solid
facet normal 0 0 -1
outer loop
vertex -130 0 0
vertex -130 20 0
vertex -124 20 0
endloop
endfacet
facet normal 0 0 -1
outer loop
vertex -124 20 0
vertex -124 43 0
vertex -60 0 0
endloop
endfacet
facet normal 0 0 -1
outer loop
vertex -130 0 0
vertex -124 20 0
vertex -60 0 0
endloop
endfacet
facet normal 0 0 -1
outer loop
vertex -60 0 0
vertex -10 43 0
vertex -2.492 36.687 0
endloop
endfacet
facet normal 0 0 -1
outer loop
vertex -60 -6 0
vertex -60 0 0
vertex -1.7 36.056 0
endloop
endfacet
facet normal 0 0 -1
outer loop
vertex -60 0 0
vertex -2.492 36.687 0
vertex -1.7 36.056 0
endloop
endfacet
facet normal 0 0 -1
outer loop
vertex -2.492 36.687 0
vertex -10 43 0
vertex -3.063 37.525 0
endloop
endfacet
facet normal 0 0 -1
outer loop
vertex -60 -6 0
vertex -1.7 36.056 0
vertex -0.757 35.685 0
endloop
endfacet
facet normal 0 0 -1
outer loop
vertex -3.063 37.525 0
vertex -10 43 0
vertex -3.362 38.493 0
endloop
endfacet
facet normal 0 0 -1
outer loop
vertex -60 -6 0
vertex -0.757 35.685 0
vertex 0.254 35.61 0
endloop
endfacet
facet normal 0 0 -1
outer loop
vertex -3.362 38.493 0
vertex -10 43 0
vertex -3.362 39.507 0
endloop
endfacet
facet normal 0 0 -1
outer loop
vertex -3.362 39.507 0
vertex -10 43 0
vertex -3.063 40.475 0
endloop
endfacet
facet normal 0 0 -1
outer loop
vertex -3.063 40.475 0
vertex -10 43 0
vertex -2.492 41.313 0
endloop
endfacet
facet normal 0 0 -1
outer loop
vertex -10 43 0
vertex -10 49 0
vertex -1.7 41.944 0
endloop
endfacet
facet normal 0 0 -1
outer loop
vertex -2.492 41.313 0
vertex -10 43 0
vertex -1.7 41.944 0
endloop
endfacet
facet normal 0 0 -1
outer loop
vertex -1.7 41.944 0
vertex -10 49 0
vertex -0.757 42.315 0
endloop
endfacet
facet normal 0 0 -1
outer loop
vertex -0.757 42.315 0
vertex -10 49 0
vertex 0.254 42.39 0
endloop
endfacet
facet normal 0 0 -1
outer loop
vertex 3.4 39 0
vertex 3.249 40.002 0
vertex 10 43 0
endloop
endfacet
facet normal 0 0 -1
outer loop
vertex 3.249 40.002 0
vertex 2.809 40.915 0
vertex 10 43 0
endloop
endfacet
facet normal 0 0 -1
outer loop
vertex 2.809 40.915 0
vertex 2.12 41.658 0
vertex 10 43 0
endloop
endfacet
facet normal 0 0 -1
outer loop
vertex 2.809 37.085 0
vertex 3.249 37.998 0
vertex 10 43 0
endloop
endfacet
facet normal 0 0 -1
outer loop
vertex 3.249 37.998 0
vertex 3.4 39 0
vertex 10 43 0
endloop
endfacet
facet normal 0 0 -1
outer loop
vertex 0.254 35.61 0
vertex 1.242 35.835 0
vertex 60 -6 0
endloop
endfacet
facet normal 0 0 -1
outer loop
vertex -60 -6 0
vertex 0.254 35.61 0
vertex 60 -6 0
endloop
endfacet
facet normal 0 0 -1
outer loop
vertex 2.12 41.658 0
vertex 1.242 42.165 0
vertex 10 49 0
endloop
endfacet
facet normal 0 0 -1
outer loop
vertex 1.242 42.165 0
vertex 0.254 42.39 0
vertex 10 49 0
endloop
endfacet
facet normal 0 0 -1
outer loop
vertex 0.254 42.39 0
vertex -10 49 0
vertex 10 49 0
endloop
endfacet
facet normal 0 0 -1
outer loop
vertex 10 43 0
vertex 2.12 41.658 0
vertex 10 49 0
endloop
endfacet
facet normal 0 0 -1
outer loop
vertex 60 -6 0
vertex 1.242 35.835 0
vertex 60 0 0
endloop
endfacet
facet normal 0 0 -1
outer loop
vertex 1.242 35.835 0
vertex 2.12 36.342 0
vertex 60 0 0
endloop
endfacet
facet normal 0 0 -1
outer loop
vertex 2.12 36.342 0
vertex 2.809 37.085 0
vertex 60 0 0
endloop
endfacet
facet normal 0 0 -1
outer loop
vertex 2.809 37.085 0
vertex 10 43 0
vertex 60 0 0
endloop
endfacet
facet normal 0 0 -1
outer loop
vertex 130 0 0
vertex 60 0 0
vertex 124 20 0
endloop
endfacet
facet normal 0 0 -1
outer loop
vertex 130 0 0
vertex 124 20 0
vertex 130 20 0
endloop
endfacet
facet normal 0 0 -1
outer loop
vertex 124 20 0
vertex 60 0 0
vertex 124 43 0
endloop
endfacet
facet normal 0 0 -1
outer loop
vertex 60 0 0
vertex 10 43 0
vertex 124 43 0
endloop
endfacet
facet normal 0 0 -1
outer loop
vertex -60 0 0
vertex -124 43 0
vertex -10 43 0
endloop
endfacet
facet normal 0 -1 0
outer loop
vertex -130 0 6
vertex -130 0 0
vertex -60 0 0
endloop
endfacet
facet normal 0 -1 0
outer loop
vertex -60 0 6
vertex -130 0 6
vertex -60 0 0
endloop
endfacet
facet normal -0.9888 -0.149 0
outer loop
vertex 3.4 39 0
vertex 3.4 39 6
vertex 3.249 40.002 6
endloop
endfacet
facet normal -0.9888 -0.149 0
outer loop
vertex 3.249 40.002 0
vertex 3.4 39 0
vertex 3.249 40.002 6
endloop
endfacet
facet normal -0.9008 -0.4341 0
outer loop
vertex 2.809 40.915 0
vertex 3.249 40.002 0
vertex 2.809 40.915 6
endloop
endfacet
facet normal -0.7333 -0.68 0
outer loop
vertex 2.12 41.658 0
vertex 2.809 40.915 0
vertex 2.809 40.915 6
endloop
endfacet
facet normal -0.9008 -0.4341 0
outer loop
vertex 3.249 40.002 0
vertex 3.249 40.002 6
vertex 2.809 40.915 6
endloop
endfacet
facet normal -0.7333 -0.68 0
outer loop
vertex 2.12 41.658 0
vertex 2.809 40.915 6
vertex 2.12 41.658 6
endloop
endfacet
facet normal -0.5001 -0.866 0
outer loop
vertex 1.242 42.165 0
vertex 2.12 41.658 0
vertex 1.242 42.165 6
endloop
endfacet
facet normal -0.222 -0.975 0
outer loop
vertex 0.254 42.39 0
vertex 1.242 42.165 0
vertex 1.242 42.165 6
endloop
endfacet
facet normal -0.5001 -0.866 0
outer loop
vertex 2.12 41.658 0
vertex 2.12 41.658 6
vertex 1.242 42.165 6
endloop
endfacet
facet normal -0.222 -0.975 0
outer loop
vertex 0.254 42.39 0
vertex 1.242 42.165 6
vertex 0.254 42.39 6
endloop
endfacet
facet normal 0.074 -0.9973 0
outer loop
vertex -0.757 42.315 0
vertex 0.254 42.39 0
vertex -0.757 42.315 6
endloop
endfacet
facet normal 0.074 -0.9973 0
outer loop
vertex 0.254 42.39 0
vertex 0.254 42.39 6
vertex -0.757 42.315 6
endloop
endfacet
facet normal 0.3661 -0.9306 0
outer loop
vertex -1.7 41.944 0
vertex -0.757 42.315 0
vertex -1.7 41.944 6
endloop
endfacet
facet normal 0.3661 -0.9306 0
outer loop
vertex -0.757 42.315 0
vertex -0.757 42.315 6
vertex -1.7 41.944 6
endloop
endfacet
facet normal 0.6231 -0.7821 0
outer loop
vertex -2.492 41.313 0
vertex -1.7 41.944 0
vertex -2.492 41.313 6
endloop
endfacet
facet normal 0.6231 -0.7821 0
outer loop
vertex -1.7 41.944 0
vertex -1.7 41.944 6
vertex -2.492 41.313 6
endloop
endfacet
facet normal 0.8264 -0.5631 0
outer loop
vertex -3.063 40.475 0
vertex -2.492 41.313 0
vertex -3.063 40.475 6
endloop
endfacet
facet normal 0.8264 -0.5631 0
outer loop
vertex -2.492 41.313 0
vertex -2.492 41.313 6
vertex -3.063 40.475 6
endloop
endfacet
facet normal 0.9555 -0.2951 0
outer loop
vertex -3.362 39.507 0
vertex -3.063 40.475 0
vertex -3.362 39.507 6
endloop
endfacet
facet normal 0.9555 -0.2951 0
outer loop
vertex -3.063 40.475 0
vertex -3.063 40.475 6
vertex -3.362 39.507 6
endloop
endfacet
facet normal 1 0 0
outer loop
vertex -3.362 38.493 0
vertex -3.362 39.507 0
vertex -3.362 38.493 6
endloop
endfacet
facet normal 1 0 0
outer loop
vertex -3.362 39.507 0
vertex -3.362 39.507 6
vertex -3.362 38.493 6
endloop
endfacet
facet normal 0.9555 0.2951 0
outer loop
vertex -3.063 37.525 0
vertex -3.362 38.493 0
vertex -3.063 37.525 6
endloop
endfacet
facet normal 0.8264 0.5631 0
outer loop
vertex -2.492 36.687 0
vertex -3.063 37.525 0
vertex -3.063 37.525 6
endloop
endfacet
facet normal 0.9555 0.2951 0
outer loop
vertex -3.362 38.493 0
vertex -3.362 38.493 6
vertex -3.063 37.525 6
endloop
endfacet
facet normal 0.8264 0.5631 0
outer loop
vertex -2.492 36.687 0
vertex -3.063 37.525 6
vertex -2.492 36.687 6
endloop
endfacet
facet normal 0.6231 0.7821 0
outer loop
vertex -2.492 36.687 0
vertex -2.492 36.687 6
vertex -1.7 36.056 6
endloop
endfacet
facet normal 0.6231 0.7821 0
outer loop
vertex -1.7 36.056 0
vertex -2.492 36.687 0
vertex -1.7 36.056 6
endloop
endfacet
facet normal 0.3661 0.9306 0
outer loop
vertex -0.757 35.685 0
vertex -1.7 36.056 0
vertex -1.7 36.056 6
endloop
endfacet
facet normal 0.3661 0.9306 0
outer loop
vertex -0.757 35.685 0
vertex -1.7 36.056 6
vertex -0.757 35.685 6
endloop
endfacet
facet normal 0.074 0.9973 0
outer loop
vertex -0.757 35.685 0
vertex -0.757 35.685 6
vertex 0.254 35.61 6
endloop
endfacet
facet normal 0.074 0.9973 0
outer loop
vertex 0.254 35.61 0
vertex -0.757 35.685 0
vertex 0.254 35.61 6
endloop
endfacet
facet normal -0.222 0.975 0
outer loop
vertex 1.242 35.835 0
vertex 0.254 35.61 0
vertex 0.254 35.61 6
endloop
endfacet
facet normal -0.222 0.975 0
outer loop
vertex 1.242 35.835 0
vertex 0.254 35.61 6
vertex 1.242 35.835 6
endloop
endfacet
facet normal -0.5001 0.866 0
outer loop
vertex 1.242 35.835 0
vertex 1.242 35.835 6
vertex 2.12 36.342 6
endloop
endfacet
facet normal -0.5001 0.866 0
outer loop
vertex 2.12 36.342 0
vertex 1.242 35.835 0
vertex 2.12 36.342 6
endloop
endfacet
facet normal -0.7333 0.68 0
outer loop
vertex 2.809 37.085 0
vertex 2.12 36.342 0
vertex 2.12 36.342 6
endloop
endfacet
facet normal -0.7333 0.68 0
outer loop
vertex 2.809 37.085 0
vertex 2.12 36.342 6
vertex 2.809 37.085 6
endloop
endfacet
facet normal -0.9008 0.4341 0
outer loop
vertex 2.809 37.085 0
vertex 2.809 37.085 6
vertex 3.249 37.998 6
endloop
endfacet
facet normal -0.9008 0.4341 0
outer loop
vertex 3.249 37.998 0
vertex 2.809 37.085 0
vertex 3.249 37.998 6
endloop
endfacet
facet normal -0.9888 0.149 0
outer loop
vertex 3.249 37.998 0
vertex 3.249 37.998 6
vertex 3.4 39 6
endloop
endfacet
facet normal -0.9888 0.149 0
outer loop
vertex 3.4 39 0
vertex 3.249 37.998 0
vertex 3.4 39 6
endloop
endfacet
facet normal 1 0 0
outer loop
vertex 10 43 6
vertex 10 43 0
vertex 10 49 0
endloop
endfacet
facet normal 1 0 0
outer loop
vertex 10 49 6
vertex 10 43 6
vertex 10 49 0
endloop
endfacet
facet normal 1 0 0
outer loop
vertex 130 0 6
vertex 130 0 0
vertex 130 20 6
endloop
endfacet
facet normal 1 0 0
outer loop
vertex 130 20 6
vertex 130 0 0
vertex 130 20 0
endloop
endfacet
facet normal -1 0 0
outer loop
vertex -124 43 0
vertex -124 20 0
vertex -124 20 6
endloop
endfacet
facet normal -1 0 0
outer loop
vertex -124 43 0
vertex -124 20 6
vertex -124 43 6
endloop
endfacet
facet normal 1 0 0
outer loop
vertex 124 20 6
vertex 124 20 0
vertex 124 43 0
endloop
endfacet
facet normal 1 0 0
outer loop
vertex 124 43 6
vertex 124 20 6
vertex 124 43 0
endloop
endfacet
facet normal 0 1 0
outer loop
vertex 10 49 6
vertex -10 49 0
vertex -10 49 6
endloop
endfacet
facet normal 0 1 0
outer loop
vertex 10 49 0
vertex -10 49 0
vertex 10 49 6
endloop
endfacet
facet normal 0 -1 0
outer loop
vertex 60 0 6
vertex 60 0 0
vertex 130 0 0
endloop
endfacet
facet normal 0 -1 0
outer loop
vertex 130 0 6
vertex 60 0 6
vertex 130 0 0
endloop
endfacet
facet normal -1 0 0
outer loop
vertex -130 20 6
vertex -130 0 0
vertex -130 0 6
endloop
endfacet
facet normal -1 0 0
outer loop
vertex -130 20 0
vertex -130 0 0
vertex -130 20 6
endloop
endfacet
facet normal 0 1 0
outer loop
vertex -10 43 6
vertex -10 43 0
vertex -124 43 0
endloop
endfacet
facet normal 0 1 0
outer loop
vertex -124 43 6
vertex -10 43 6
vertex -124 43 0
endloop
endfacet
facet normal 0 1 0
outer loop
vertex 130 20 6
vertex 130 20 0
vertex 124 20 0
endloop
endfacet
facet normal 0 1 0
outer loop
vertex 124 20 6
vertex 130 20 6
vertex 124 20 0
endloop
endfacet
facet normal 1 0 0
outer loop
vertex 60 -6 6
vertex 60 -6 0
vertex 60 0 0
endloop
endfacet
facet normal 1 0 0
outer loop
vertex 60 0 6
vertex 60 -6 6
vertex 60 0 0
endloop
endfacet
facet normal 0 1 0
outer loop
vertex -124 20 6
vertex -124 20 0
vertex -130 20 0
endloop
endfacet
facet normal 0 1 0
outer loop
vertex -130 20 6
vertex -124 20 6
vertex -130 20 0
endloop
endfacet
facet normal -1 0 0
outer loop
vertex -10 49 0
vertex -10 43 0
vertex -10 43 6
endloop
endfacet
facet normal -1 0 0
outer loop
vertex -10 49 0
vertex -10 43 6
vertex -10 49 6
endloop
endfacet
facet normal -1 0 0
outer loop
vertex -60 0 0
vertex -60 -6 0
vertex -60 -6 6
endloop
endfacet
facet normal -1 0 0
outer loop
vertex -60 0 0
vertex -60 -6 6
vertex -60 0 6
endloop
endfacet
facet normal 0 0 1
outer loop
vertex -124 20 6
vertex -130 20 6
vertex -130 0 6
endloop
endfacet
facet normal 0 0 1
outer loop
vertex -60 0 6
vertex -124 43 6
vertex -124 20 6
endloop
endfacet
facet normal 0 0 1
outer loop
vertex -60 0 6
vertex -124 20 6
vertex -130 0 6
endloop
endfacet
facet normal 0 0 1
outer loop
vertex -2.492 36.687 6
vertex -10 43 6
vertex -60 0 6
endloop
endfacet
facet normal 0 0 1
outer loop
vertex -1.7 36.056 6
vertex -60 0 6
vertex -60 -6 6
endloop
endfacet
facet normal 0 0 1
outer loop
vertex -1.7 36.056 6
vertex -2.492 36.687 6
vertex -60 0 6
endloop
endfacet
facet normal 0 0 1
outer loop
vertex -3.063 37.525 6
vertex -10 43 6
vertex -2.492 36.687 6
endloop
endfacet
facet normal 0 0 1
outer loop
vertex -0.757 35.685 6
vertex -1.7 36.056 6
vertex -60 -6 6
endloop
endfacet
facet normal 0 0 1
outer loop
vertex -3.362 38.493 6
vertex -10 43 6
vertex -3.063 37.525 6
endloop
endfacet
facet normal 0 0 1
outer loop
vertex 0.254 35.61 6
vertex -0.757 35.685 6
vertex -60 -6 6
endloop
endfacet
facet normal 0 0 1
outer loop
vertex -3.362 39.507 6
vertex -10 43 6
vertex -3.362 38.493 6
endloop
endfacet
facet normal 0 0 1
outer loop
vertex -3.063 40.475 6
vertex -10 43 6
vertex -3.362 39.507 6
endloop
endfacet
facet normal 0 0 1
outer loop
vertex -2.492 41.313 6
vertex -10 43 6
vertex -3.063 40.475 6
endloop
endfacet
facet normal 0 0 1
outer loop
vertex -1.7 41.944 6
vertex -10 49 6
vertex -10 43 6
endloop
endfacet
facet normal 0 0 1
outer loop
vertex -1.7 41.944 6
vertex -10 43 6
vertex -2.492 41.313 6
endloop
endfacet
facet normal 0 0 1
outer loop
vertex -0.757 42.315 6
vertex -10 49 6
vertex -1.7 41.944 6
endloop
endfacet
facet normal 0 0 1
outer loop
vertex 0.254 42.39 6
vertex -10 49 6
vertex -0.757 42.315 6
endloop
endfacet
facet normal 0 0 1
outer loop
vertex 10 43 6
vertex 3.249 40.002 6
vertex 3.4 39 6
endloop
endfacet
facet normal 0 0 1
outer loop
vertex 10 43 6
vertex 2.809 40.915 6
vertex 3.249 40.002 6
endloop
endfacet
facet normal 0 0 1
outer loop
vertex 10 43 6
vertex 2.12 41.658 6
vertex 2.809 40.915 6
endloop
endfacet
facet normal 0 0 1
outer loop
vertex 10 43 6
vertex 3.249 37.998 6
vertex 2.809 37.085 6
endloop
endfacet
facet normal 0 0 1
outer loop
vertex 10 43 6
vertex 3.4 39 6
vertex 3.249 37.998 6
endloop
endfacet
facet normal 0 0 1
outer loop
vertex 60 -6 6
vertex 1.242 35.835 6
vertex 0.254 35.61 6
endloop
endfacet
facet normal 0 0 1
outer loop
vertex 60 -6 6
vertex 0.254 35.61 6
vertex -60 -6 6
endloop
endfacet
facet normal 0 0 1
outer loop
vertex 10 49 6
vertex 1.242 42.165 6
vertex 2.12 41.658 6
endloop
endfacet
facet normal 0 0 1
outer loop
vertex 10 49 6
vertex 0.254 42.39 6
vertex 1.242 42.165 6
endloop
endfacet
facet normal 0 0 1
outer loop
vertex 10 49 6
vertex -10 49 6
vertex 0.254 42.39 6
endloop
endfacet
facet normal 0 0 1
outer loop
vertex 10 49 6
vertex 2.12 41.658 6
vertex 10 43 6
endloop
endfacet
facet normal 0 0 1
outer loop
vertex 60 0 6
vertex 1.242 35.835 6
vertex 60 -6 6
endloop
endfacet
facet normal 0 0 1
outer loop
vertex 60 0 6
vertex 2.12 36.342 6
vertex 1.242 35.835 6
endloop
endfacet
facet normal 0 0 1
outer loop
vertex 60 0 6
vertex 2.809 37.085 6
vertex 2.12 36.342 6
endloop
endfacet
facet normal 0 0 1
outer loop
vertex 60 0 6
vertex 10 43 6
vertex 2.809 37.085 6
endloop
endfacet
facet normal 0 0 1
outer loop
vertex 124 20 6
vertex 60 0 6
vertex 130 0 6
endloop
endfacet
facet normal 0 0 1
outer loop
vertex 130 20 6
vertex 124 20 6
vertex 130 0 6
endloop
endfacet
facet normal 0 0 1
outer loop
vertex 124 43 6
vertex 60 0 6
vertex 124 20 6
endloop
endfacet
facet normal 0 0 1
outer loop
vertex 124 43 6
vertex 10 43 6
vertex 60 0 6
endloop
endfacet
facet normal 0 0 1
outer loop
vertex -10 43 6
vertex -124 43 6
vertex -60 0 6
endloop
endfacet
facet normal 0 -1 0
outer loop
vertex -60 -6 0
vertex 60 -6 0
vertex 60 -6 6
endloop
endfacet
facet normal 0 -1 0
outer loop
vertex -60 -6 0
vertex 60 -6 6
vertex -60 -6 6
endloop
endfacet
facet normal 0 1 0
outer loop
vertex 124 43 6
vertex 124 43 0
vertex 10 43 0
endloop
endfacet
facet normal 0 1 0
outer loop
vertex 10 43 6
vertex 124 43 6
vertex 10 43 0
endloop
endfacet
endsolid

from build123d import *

# Parameters (mm, degrees)
SKETCH1_W              = 260
SKETCH1_H              = 49
BOSS_EXTRUDE1_DEPTH    = 6
SKETCH2_W              = 120
SKETCH2_H              = 6
CUT_EXTRUDE1_DEPTH     = 6
M8X1_25_TAPPED_HOLE1_D = 6.8
CUT_EXTRUDE2_REACH     = 141.058
SKETCH5_W              = 6
SKETCH5_H              = 23
SKETCH6_W              = 120
SKETCH6_H              = 6
BOSS_EXTRUDE2_DEPTH    = 6


with BuildPart() as part:
    # Sketch1 → Boss-Extrude1 (new body)
    with BuildSketch(Plane.XY):
        with Locations((0, 24.5)):
            Rectangle(SKETCH1_W, SKETCH1_H)
    extrude(amount=BOSS_EXTRUDE1_DEPTH)

    # Sketch2 → Cut-Extrude1 (cut)
    with BuildSketch(Plane(origin=(0, 0, 0), x_dir=(-1, 0, 0), z_dir=(0, 0, -1))):
        with Locations((-70, 46)):
            Rectangle(SKETCH2_W, SKETCH2_H)
        with Locations((70, 46)):
            Rectangle(SKETCH2_W, SKETCH2_H)
    extrude(amount=-CUT_EXTRUDE1_DEPTH, mode=Mode.SUBTRACT)

    # M8x1.25 Tapped Hole1 (through all)
    with Locations(Plane(origin=(0, 0, 0), x_dir=(-1, 0, 0), z_dir=(0, 0, -1))):
        with Locations((0, 39)):
            Hole(M8X1_25_TAPPED_HOLE1_D / 2)

    # Sketch5 → Cut-Extrude2 (cut, up to next)
    with BuildSketch(Plane(origin=(0, 0, 0), x_dir=(-1, 0, 0), z_dir=(0, 0, -1)), mode=Mode.PRIVATE) as cut_extrude2_sk1:
        with Locations((-127, 31.5)):
            Rectangle(SKETCH5_W, SKETCH5_H)
    cut_extrude2_tool1 = extrude(cut_extrude2_sk1.sketch, amount=-CUT_EXTRUDE2_REACH, mode=Mode.PRIVATE) & part.part
    # Sketch5 → Cut-Extrude2 (cut, up to next)
    with BuildSketch(Plane(origin=(0, 0, 0), x_dir=(-1, 0, 0), z_dir=(0, 0, -1)), mode=Mode.PRIVATE) as cut_extrude2_sk2:
        with Locations((127, 31.5)):
            Rectangle(SKETCH5_W, SKETCH5_H)
    cut_extrude2_tool2 = extrude(cut_extrude2_sk2.sketch, amount=-CUT_EXTRUDE2_REACH, mode=Mode.PRIVATE) & part.part
    add(cut_extrude2_tool1.solids().sort_by_distance((127, 31.5, 0))[0], mode=Mode.SUBTRACT)
    add(cut_extrude2_tool2.solids().sort_by_distance((-127, 31.5, 0))[0], mode=Mode.SUBTRACT)

    # Sketch6 → Boss-Extrude2 (add)
    with BuildSketch(Plane(origin=(0, 0, 0), x_dir=(-1, 0, 0), z_dir=(0, 0, -1))):
        with Locations((0, -3)):
            Rectangle(SKETCH6_W, SKETCH6_H)
    extrude(amount=-BOSS_EXTRUDE2_DEPTH)


solid = part.part
